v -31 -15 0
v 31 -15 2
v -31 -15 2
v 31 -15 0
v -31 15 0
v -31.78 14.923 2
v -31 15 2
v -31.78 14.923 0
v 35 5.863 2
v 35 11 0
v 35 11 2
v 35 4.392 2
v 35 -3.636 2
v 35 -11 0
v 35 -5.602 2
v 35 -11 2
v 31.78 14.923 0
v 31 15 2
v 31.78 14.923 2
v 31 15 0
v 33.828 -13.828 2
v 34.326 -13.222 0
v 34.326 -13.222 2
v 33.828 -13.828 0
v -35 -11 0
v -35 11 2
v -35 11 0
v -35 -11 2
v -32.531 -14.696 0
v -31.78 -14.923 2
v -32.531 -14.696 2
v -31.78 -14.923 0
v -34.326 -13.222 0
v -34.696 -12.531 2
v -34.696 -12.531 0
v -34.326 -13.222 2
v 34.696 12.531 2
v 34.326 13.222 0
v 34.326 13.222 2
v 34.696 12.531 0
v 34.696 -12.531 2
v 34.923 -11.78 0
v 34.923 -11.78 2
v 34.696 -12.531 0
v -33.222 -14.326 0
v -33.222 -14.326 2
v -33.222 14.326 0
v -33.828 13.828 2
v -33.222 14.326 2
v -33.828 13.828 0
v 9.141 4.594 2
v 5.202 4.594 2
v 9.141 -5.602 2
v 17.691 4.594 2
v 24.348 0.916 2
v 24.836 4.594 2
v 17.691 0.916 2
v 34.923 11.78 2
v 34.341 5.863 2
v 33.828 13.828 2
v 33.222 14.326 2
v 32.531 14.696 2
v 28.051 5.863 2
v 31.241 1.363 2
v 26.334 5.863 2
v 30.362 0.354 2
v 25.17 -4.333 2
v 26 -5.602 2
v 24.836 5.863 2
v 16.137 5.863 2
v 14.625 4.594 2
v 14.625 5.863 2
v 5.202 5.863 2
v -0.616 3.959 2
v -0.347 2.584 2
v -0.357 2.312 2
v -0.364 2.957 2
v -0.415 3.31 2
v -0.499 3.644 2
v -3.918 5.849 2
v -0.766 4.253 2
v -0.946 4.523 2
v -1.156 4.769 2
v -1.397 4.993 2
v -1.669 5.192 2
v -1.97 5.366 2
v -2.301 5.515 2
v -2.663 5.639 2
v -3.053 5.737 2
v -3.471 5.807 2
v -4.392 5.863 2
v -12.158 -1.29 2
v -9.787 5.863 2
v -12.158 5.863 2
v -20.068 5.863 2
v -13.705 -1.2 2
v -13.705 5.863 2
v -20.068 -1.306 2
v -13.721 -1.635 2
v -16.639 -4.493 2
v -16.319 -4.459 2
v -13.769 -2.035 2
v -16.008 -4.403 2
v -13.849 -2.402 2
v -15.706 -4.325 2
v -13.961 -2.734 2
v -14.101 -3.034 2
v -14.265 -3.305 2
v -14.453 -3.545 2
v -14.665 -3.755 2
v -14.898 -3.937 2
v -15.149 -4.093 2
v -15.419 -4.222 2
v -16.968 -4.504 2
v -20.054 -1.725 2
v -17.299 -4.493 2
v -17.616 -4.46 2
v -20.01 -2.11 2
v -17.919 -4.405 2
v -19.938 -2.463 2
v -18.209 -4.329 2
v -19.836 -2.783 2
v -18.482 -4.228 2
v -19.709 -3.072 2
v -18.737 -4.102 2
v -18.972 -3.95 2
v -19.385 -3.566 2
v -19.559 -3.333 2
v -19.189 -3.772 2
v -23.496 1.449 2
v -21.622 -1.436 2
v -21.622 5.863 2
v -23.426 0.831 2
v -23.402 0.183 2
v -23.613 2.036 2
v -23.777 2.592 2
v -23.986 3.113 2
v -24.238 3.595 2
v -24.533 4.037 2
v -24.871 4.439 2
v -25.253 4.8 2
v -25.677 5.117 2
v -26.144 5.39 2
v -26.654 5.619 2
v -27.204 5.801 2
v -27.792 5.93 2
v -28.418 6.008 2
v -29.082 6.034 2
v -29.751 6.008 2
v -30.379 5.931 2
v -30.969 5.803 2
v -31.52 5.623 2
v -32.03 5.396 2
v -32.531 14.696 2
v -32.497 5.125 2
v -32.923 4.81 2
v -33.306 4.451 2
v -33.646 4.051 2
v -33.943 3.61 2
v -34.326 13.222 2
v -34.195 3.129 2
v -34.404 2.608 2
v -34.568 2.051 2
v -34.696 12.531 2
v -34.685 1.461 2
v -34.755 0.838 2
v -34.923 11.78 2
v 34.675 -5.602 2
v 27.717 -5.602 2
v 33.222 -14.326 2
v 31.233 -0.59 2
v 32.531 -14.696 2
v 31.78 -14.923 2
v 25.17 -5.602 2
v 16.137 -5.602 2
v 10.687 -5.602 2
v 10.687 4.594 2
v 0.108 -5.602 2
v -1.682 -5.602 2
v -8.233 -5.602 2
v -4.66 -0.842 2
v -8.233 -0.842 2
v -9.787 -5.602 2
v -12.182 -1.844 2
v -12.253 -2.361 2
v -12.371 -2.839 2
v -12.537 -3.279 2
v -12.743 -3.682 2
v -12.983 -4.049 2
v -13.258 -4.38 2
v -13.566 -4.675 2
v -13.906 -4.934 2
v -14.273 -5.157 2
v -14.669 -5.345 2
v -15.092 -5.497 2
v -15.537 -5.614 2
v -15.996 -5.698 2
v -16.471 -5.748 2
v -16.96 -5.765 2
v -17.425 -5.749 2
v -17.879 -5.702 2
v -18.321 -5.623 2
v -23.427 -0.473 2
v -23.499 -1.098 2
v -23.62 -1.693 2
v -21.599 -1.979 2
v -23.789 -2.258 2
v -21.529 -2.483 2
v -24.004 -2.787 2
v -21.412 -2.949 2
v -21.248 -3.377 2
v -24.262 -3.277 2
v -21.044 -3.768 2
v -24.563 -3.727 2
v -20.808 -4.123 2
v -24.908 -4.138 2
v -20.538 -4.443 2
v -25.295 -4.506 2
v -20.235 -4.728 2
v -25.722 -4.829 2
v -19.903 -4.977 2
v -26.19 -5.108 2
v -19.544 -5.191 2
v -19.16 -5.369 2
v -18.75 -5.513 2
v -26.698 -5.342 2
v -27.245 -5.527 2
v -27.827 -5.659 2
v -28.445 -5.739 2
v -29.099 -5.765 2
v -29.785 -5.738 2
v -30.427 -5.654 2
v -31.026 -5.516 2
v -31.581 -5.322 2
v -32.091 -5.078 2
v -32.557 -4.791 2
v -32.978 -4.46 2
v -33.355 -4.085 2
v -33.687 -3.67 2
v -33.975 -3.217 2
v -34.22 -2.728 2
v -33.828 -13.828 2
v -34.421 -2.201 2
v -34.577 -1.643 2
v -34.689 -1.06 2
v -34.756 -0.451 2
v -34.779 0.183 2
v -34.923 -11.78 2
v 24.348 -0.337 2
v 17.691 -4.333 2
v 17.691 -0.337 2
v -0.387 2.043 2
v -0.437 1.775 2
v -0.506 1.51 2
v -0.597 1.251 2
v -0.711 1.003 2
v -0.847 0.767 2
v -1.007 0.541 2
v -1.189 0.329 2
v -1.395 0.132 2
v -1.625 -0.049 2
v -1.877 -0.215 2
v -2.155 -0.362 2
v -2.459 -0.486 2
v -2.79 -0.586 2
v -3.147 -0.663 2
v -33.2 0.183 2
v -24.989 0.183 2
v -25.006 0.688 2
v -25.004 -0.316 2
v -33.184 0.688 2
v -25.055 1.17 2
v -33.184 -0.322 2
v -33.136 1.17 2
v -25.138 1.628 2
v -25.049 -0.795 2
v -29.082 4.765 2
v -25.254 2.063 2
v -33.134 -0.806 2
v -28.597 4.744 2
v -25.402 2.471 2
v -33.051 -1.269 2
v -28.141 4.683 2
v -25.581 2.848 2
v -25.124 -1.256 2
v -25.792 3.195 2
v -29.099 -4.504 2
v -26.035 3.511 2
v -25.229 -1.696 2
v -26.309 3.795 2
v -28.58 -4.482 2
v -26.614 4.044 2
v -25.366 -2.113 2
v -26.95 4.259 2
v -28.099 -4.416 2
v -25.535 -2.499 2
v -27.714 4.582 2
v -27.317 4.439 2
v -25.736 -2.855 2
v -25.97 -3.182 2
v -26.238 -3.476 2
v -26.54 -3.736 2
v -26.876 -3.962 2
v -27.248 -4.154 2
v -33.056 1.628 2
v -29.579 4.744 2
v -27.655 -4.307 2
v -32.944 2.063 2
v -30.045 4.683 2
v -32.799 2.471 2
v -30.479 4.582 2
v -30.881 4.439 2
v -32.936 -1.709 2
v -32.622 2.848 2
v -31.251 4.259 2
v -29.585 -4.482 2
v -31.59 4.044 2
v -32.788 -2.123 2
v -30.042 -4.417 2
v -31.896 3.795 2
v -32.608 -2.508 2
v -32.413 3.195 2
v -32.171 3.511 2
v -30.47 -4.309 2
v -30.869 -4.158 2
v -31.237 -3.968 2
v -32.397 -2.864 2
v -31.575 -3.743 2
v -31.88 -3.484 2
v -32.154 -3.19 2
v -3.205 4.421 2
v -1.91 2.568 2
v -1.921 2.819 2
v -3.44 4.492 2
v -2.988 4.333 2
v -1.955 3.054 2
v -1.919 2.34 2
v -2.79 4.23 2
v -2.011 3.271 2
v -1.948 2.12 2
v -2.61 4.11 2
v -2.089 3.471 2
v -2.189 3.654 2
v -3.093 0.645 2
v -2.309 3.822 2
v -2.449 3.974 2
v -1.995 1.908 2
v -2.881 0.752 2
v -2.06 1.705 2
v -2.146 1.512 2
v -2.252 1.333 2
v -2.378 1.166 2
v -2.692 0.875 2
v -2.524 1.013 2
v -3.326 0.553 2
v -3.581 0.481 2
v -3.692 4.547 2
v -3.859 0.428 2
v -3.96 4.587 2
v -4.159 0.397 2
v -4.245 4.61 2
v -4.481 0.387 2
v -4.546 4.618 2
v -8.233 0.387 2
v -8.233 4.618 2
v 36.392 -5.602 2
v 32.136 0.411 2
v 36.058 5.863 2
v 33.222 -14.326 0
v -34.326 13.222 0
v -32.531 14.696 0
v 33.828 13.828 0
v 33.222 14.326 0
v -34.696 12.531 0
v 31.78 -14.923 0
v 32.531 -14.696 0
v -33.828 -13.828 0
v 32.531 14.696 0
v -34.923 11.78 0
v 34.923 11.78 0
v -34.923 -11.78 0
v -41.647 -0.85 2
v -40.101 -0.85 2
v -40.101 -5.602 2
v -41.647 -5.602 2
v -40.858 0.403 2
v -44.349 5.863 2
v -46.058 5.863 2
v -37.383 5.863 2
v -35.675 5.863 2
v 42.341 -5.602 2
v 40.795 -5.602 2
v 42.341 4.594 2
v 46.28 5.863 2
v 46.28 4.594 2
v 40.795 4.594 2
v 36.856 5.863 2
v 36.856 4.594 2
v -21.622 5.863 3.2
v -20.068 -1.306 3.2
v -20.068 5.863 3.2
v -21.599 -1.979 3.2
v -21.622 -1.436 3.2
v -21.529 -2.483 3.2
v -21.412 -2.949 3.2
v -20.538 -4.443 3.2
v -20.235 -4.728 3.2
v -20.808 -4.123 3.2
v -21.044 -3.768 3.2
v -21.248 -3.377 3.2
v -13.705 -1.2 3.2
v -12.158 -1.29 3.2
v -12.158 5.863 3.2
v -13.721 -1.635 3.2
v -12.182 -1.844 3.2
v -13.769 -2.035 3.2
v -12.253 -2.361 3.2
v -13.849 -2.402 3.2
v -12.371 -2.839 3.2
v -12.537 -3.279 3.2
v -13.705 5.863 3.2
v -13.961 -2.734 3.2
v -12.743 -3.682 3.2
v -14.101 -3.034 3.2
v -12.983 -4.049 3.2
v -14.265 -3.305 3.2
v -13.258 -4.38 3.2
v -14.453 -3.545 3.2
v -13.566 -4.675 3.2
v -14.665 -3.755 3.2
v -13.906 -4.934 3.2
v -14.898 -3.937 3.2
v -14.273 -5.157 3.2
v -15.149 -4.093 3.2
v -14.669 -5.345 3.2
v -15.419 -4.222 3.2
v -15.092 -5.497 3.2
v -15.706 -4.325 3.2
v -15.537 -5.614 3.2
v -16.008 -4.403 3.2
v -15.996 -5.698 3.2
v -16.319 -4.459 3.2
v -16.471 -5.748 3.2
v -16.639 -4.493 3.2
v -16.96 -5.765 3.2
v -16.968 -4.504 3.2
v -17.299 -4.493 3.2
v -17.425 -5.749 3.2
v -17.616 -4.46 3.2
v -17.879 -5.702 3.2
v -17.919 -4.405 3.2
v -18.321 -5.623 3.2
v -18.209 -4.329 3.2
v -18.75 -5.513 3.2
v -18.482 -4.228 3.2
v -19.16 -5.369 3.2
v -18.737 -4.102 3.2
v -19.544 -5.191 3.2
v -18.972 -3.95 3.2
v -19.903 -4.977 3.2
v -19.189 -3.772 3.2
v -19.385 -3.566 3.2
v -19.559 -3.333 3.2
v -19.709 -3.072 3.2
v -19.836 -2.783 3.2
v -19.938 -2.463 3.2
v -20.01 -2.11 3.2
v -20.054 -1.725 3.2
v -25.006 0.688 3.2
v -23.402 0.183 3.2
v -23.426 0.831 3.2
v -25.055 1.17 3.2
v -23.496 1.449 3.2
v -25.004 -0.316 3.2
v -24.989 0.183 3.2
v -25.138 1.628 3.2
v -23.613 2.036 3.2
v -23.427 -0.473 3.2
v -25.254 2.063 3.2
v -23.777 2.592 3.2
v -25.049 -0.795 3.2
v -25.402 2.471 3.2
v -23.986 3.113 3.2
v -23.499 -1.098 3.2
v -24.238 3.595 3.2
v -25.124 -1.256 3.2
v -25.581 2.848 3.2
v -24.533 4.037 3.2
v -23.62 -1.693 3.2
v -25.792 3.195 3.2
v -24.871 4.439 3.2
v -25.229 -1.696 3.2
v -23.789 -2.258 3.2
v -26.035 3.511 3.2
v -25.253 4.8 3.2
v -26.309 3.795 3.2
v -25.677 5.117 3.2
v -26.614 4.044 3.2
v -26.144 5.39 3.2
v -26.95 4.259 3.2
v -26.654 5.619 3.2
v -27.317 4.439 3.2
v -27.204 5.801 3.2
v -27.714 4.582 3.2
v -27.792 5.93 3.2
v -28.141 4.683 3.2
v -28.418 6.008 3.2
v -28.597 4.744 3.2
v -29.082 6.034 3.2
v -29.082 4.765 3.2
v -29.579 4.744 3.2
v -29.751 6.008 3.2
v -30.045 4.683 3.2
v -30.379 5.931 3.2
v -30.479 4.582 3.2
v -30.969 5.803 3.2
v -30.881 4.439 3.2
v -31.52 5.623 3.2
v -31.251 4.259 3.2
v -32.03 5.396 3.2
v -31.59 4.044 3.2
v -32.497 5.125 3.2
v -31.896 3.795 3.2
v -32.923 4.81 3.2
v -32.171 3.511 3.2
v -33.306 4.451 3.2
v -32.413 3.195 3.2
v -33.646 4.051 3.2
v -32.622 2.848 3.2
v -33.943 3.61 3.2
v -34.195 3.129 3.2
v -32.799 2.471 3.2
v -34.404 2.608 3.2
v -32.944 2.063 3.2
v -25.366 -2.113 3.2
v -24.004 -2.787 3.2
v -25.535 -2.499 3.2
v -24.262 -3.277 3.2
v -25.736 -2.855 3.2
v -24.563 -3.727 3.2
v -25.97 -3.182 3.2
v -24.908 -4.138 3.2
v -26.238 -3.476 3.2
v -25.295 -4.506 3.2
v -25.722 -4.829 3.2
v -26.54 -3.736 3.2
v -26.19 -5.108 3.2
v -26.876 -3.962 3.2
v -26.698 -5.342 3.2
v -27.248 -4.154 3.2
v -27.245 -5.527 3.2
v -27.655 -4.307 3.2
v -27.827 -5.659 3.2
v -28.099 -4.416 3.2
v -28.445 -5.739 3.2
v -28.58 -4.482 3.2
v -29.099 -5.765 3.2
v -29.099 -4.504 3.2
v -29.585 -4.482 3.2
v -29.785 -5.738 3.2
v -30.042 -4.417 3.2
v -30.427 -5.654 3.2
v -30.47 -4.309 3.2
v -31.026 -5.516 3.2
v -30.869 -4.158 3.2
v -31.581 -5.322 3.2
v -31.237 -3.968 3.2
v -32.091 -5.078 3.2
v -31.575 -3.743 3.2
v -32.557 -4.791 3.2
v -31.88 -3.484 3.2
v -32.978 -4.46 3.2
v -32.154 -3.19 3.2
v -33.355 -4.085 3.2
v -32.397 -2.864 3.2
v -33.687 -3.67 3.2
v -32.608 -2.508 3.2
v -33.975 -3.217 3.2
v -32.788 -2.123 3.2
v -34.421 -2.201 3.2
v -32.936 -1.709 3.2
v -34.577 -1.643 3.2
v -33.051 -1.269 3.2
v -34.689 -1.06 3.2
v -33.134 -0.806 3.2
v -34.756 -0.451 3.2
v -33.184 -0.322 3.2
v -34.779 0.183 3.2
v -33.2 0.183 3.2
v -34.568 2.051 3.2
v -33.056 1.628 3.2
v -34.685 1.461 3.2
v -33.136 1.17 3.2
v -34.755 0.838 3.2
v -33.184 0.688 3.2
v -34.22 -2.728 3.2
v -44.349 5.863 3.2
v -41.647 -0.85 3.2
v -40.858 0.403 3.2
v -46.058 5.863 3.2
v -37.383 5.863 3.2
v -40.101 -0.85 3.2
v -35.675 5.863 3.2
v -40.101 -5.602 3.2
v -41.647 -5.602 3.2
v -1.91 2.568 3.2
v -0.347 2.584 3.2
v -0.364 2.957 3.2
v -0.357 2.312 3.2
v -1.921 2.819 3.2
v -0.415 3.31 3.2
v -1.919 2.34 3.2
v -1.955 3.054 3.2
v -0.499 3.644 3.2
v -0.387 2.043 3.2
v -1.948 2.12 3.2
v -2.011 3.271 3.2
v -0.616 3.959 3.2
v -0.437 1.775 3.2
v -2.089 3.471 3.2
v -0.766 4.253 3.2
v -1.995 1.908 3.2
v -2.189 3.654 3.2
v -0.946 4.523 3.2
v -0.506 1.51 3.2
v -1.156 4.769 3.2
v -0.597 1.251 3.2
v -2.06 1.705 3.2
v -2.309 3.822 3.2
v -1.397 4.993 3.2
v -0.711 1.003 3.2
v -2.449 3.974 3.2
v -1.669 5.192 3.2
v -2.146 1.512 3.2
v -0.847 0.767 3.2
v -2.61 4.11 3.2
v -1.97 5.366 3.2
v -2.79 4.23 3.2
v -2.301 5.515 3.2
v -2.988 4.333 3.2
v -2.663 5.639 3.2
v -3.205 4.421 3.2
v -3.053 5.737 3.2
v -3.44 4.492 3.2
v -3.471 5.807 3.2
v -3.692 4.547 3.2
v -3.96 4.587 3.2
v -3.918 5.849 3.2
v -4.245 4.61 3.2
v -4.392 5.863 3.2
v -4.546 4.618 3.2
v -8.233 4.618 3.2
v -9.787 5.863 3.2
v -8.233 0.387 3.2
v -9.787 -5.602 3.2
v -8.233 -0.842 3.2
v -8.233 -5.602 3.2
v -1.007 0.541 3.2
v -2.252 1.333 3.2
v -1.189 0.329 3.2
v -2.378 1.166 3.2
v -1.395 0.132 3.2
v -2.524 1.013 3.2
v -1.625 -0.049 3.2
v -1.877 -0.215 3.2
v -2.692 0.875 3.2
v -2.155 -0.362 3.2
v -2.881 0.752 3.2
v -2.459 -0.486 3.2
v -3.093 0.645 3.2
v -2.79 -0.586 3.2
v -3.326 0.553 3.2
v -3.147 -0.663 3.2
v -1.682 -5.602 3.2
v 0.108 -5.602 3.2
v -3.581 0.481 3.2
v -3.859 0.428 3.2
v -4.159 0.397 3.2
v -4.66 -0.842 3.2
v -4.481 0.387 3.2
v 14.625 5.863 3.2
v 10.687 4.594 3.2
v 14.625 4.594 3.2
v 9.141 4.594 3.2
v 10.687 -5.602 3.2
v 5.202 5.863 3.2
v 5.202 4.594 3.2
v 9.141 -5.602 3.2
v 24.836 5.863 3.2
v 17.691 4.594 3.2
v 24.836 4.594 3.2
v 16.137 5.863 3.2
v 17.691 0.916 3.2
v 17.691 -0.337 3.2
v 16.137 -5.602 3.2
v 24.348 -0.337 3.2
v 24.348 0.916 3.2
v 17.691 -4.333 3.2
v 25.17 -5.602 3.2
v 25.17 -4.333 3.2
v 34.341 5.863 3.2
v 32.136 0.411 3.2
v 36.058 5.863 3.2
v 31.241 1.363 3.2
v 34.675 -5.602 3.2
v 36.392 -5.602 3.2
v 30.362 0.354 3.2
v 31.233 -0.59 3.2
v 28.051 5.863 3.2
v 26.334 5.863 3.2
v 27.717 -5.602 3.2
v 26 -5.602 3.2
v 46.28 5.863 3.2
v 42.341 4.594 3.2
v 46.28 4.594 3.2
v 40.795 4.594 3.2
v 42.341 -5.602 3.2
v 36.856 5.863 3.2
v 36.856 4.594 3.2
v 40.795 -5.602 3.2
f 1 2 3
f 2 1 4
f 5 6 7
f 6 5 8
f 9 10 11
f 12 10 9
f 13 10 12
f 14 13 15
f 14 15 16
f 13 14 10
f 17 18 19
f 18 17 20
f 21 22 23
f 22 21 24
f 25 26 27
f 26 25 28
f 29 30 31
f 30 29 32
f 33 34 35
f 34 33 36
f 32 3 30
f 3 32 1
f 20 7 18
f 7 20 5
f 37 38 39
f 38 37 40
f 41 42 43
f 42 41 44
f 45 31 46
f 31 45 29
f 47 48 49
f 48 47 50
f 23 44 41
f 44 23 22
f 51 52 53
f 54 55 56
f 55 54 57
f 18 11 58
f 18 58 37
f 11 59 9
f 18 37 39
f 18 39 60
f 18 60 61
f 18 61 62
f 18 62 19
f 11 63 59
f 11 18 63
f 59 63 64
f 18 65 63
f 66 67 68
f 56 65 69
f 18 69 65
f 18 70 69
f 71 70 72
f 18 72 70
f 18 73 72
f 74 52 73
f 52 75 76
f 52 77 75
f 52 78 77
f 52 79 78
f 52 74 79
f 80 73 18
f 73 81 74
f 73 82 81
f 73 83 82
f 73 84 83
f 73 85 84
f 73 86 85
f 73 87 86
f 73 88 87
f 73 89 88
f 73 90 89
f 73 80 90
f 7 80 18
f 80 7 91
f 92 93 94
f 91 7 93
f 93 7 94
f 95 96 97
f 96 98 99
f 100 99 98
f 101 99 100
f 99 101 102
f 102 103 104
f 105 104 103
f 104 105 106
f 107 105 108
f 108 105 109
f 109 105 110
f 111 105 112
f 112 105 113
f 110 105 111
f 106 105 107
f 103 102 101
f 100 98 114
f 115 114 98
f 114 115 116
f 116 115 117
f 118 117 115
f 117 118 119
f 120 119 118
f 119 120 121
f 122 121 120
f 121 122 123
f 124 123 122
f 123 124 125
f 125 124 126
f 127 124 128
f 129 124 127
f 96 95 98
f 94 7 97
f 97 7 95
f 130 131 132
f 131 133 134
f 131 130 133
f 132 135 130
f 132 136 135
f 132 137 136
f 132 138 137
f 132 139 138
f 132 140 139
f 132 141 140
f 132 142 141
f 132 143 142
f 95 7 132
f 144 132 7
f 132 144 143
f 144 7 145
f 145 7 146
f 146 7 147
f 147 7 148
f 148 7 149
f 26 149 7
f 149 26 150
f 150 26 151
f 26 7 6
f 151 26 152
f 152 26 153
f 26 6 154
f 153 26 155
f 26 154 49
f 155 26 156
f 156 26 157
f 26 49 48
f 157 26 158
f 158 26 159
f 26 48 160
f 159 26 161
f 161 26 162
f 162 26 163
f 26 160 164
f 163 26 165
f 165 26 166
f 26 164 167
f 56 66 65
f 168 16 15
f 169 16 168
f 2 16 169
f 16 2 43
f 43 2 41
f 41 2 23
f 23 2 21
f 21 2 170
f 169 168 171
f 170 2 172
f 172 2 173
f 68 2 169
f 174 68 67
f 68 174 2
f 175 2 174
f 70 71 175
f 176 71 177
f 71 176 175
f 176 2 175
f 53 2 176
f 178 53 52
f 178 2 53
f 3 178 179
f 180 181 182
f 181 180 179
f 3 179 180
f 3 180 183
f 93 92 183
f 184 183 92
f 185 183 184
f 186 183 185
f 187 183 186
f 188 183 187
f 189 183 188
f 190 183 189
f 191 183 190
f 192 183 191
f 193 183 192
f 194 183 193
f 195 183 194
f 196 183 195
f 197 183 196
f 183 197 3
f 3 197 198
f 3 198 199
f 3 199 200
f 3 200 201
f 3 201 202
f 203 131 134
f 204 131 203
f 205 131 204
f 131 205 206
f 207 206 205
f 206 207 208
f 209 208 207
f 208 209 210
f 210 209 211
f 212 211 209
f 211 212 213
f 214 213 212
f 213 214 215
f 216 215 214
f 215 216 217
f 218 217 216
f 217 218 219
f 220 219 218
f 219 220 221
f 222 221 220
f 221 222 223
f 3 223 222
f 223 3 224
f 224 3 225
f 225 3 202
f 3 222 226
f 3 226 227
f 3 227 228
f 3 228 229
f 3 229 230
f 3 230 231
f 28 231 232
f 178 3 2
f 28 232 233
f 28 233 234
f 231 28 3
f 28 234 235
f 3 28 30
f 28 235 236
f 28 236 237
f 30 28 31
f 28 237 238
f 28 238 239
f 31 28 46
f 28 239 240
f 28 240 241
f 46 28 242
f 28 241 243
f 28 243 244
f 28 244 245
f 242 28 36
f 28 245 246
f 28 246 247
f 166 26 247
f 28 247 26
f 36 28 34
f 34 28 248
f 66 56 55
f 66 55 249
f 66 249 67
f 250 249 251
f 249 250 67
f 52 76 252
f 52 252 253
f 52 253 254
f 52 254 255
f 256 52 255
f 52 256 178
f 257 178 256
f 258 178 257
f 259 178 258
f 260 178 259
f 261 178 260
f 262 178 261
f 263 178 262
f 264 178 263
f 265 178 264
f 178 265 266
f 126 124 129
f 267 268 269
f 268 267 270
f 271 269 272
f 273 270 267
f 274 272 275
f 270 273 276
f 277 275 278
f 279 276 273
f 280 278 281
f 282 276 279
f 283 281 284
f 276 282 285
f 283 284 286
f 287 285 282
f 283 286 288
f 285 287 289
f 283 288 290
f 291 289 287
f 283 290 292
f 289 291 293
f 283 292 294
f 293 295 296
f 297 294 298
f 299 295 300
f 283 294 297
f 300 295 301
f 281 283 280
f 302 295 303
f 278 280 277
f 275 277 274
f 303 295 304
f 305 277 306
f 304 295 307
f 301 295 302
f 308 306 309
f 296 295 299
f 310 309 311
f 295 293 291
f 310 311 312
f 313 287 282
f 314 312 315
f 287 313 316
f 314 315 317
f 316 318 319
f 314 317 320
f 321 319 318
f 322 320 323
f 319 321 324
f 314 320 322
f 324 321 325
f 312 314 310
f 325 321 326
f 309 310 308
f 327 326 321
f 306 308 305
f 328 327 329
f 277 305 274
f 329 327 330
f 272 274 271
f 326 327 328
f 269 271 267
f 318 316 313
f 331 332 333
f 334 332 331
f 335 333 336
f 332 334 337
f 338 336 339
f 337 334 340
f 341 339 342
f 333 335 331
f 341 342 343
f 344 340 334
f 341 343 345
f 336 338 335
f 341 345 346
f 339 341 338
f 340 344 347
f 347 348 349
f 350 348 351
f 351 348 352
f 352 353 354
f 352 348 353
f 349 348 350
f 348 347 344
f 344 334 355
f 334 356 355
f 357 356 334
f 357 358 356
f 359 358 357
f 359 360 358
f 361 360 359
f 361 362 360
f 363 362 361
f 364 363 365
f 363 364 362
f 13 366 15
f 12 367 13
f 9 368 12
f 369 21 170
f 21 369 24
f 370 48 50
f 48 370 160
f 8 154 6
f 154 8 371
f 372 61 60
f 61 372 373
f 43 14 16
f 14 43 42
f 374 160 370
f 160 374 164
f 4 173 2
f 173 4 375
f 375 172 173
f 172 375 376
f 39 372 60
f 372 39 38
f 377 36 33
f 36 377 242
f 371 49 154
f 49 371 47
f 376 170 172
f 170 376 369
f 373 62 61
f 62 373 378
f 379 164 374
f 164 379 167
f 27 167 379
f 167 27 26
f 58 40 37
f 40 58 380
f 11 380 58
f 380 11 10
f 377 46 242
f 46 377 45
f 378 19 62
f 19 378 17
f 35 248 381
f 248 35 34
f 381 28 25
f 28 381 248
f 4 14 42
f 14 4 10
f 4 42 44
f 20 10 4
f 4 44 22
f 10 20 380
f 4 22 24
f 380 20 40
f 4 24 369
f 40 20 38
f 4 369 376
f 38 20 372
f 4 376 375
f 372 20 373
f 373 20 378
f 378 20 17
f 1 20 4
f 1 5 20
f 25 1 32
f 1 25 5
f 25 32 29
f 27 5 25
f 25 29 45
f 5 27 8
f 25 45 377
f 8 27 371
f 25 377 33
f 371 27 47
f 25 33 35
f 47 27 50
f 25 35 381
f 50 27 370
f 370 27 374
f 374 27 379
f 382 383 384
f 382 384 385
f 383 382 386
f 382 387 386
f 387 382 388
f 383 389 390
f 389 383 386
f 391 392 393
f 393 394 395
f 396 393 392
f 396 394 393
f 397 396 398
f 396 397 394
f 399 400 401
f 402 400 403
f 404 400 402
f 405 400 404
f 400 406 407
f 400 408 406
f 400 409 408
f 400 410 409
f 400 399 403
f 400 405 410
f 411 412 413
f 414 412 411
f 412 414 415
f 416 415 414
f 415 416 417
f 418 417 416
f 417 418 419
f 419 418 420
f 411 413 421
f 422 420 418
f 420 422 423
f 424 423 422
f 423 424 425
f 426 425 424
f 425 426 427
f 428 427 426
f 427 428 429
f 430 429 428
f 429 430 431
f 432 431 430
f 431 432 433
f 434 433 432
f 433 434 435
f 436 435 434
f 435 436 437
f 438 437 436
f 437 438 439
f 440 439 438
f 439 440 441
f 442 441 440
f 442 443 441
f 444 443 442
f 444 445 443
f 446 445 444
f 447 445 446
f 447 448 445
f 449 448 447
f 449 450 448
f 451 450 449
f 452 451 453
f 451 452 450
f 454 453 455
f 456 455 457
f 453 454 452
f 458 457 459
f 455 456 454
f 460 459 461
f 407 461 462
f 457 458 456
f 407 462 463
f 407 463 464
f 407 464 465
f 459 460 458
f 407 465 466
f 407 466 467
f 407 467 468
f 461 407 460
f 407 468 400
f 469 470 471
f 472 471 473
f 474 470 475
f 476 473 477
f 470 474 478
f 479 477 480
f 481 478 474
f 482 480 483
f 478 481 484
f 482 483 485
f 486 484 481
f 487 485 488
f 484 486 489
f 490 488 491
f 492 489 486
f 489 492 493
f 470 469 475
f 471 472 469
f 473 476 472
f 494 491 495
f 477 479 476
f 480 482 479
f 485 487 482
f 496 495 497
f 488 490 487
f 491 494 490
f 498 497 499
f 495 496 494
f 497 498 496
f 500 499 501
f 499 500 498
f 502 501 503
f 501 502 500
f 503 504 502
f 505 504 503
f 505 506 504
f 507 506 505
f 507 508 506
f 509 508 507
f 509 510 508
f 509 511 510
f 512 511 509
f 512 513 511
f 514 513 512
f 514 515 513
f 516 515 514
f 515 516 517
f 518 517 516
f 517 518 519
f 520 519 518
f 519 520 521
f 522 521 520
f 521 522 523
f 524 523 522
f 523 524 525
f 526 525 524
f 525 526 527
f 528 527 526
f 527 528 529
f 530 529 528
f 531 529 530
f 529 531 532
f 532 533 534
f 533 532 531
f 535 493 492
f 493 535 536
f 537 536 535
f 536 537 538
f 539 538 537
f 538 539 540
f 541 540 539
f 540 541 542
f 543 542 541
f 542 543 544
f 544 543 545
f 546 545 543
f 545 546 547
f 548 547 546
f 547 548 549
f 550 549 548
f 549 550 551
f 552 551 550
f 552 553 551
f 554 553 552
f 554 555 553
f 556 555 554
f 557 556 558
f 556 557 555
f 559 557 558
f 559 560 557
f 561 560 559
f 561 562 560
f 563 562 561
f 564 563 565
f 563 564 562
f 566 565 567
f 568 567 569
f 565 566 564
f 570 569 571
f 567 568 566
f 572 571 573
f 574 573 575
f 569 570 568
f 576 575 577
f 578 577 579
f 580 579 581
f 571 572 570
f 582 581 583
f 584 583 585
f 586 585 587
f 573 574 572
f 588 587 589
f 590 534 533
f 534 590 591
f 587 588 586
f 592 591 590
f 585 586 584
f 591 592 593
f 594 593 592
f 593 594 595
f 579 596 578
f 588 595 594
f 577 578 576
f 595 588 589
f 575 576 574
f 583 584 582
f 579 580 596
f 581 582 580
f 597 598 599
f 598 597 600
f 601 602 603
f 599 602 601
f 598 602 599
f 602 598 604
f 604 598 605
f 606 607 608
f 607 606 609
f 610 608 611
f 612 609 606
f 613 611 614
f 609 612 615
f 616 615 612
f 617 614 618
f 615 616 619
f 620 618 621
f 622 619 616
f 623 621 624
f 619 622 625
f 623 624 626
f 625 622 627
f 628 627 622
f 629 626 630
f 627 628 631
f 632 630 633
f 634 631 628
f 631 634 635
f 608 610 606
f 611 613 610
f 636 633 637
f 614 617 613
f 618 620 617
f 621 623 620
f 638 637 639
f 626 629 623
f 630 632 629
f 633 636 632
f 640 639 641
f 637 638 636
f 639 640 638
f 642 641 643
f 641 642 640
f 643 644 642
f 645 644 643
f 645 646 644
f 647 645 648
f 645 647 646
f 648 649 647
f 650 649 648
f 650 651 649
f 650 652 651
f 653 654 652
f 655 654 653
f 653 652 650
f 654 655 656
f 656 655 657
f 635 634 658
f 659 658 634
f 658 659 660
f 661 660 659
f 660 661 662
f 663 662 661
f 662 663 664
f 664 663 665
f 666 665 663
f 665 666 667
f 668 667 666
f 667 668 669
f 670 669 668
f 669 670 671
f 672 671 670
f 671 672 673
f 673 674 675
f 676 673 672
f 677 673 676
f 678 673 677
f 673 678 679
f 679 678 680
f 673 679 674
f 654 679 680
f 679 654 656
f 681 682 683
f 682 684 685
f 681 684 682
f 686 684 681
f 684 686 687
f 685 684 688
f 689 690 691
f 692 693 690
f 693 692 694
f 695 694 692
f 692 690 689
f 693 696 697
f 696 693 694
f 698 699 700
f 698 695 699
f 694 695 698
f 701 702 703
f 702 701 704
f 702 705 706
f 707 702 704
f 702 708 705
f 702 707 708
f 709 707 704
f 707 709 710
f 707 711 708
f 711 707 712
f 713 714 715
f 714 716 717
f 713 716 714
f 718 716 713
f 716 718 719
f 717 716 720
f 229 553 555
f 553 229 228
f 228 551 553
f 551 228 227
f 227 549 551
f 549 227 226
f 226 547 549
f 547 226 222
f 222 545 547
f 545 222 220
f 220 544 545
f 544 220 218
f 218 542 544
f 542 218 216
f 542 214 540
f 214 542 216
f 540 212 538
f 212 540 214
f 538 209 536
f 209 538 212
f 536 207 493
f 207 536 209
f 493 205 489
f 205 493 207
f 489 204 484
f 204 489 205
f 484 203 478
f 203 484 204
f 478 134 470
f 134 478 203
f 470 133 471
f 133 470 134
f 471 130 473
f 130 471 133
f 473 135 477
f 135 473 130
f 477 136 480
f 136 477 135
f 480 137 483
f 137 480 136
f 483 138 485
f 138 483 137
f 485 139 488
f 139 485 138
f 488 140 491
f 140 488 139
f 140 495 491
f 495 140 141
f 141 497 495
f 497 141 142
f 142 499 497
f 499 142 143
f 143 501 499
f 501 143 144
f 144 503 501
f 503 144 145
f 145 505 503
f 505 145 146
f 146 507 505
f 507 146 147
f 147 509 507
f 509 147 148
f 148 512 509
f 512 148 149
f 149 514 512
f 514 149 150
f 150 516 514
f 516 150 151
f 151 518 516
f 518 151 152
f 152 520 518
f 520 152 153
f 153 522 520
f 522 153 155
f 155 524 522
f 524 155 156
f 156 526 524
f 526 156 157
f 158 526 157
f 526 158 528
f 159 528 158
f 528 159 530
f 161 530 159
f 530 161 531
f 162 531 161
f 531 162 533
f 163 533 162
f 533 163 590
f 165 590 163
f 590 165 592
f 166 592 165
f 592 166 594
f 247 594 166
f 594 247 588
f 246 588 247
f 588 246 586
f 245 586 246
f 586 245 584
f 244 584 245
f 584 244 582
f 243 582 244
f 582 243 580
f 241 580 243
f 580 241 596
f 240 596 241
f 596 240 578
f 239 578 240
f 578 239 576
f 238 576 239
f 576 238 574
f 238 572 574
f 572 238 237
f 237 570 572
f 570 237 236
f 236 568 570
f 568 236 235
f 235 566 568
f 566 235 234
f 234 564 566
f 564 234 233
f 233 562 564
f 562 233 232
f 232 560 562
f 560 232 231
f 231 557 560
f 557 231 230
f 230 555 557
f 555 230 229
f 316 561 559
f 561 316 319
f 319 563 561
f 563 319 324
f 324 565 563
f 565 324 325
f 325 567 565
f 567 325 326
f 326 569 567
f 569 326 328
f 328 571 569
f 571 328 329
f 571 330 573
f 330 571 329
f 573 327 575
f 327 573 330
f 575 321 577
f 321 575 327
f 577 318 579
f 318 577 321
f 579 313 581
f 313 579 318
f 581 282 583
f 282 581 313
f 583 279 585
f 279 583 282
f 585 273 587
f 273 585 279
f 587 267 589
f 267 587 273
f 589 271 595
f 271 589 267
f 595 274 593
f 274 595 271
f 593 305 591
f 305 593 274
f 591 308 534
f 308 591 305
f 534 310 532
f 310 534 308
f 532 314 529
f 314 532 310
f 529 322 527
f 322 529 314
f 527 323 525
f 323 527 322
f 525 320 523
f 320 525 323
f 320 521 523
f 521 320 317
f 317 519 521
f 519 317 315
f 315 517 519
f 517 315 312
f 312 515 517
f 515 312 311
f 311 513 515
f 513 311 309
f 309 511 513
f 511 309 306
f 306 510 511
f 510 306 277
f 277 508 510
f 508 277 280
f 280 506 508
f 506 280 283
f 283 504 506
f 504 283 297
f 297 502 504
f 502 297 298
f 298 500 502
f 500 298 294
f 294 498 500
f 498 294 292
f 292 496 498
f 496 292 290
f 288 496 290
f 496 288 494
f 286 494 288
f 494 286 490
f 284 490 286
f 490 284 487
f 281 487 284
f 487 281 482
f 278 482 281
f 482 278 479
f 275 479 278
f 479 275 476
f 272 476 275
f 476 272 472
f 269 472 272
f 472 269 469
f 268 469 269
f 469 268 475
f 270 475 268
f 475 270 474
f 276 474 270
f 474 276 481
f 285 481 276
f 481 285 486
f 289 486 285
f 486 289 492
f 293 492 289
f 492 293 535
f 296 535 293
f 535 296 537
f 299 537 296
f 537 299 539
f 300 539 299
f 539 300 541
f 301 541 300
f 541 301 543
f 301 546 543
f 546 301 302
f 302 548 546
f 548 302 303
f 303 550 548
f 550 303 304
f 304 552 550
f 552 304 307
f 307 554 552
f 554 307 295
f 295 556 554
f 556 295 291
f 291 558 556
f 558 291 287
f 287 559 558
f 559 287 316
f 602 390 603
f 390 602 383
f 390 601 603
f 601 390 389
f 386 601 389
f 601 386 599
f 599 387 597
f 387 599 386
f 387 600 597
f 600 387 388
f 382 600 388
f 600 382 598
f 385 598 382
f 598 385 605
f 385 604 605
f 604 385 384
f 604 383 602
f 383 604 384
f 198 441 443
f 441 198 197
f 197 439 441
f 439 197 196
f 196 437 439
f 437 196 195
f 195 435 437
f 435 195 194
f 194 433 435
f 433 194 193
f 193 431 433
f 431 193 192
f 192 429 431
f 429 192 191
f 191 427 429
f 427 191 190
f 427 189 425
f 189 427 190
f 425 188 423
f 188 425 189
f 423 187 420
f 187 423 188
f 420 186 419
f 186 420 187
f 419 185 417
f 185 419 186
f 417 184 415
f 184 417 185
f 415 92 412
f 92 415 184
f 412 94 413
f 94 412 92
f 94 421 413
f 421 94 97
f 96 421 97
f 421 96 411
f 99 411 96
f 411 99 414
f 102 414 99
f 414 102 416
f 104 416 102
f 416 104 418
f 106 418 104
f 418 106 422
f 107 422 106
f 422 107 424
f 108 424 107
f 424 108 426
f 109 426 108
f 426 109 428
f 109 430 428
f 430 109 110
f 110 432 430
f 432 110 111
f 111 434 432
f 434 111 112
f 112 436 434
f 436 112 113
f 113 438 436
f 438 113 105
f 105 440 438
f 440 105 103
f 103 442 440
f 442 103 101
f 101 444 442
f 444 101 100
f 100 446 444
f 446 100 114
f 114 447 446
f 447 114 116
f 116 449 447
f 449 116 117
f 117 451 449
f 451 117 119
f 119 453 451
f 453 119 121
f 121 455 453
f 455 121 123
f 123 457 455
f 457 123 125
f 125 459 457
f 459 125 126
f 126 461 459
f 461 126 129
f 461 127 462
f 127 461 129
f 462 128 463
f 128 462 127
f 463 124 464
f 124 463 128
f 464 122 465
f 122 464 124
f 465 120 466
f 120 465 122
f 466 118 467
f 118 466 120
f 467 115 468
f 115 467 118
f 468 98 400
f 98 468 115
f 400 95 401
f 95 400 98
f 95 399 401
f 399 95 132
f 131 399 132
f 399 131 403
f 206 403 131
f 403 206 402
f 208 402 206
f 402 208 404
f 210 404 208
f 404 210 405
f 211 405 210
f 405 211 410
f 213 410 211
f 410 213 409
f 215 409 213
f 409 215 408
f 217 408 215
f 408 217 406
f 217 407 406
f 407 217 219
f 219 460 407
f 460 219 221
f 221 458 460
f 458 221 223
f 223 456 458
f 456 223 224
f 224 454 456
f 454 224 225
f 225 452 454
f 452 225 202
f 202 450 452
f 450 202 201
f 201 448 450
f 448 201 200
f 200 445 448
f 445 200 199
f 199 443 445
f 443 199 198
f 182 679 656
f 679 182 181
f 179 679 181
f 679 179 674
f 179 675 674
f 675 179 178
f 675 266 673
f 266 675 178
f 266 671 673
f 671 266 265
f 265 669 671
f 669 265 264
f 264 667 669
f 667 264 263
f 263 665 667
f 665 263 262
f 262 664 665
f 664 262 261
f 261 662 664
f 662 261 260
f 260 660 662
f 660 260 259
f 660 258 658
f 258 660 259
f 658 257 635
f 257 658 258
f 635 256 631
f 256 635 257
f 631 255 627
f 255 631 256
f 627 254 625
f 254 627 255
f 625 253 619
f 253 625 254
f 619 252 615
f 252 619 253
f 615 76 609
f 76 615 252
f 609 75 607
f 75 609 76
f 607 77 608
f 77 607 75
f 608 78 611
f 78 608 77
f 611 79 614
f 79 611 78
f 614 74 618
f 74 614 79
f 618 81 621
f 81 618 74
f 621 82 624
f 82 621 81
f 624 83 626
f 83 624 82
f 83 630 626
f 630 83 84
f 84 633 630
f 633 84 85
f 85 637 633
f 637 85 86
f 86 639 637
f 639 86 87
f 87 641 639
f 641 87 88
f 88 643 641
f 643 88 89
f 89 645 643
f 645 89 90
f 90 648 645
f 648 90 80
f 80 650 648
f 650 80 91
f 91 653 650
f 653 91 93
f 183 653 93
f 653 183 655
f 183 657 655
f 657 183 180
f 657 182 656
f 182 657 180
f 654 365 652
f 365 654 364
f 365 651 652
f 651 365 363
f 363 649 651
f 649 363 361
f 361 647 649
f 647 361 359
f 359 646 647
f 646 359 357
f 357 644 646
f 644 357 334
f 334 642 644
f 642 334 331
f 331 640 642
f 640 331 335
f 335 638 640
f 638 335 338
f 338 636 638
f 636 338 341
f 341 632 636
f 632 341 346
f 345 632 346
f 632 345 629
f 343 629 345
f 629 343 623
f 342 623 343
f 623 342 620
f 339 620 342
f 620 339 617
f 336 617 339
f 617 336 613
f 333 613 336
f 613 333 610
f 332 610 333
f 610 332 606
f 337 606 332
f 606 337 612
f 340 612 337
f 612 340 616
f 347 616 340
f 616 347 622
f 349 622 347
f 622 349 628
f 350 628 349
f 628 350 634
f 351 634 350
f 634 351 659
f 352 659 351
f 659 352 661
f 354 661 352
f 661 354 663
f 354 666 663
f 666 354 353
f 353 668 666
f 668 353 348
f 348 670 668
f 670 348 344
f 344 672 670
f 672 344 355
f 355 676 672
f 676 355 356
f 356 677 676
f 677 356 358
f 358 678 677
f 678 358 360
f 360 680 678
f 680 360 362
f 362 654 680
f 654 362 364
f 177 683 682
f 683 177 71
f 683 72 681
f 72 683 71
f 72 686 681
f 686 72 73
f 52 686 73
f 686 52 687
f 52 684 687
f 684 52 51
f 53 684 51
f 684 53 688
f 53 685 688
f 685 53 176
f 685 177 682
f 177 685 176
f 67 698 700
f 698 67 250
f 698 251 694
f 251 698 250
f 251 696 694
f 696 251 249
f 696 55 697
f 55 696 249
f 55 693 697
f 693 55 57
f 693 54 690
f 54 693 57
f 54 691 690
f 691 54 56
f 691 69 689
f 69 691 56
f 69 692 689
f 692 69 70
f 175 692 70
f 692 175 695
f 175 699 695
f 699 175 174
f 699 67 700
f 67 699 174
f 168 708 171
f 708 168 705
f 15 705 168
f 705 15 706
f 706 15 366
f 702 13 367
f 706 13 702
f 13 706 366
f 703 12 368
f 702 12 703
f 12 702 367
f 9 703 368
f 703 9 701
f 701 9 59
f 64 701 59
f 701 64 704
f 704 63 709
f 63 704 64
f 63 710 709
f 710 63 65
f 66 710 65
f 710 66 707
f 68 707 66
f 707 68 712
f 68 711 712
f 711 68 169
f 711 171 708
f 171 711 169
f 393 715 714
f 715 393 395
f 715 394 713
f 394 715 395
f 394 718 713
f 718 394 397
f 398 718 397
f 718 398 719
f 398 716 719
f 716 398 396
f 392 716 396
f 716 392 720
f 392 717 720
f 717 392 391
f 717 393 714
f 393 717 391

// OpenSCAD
// Multicolor Badge — 2-color FDM print
//
// PRINTING INSTRUCTIONS:
//   Single-extruder:  Set a filament/color change pause in your slicer at layer height = base_thick mm.
//                     Print base in Color A, then swap to Color B for the text layer.
//   Multi-material:   Export the two bodies as separate STLs using your slicer's split feature,
//                     or use the slicer's paint/color tool to assign colors per region.
//
// The base plate is printed in the first color.
// The raised text / emblem is printed in the second color.

w          = 70;      // badge width (mm)
h          = 30;      // badge height (mm)
base_thick = 2.0;     // base plate thickness (mm) — filament change at this height
text_height= 1.2;     // raised text / emblem height above the base
corner_r   = 4.0;     // corner radius

// Text
line1       = "YOUR TEXT";
line2       = "";
text_size   = 12;
line_gap    = 8;
pad_x       = 5;
pad_y       = 4;
text_align  = "center";
emboss      = 1;      // 1 = text raised (emboss), 0 = text sunken (engrave)
offset_x    = 0;
offset_y    = 0;

// Emblem
emblem_enabled = 0;
emblem_path    = "";
emblem_kind    = "svg";
emblem_scale   = 0.25;
emblem_x       = 0;
emblem_y       = 0;
emblem_rot     = 0;
emblem_mode    = 1;
emblem_depth   = 1.2;
emblem_invert  = 0;

$fa = 4; $fs = 0.6;

function text_anchor(align) =
    align == "left"  ? "left" :
    align == "right" ? "right" : "center";

module rounded_plate(pw, ph, thick, r) {
    hull() {
        for (dx = [-1, 1], dy = [-1, 1]) {
            translate([dx * (pw/2 - r), dy * (ph/2 - r), 0])
            cylinder(r = r, h = thick, $fn = 32);
        }
    }
}

module text_2d(line, size, align) {
    text(line, size = size, halign = text_anchor(align), valign = "center", $fn = 24);
}

module text_body() {
    if (emboss == 1) {
        // Raised text on top of base
        translate([offset_x, offset_y, base_thick])
        linear_extrude(height = text_height)
        union() {
            if (line1 != "")
                translate([0, (line2 != "" ? line_gap/2 : 0), 0])
                text_2d(line1, text_size, text_align);
            if (line2 != "")
                translate([0, -(line_gap/2), 0])
                text_2d(line2, text_size, text_align);
        }
    } else {
        // Engraved text — cut into the base
        translate([0, 0, -0.01])
        linear_extrude(height = text_height + 0.01)
        union() {
            if (line1 != "")
                translate([offset_x, offset_y + (line2 != "" ? line_gap/2 : 0), 0])
                text_2d(line1, text_size, text_align);
            if (line2 != "")
                translate([offset_x, offset_y - line_gap/2, 0])
                text_2d(line2, text_size, text_align);
        }
    }
}

module emblem_shape() {
    if (emblem_kind == "heightmap" && emblem_path != "") {
        scale([emblem_scale, emblem_scale, emblem_depth / 2])
        translate([0, 0, 1])
        surface(file = emblem_path, center = true);
    } else if (emblem_path != "") {
        scale([emblem_scale, emblem_scale, 1])
        linear_extrude(height = emblem_depth)
        import(emblem_path);
    }
}

module emblem_body() {
    if (emblem_enabled == 1 && emblem_path != "") {
        translate([emblem_x, emblem_y, base_thick])
        rotate([0, 0, emblem_rot])
        emblem_shape();
    }
}

// Base plate (Color A)
difference() {
    rounded_plate(w, h, base_thick, corner_r);
    if (emboss == 0) text_body();
}

// Raised elements (Color B — printed after filament change at base_thick)
if (emboss == 1) {
    text_body();
    emblem_body();
}
